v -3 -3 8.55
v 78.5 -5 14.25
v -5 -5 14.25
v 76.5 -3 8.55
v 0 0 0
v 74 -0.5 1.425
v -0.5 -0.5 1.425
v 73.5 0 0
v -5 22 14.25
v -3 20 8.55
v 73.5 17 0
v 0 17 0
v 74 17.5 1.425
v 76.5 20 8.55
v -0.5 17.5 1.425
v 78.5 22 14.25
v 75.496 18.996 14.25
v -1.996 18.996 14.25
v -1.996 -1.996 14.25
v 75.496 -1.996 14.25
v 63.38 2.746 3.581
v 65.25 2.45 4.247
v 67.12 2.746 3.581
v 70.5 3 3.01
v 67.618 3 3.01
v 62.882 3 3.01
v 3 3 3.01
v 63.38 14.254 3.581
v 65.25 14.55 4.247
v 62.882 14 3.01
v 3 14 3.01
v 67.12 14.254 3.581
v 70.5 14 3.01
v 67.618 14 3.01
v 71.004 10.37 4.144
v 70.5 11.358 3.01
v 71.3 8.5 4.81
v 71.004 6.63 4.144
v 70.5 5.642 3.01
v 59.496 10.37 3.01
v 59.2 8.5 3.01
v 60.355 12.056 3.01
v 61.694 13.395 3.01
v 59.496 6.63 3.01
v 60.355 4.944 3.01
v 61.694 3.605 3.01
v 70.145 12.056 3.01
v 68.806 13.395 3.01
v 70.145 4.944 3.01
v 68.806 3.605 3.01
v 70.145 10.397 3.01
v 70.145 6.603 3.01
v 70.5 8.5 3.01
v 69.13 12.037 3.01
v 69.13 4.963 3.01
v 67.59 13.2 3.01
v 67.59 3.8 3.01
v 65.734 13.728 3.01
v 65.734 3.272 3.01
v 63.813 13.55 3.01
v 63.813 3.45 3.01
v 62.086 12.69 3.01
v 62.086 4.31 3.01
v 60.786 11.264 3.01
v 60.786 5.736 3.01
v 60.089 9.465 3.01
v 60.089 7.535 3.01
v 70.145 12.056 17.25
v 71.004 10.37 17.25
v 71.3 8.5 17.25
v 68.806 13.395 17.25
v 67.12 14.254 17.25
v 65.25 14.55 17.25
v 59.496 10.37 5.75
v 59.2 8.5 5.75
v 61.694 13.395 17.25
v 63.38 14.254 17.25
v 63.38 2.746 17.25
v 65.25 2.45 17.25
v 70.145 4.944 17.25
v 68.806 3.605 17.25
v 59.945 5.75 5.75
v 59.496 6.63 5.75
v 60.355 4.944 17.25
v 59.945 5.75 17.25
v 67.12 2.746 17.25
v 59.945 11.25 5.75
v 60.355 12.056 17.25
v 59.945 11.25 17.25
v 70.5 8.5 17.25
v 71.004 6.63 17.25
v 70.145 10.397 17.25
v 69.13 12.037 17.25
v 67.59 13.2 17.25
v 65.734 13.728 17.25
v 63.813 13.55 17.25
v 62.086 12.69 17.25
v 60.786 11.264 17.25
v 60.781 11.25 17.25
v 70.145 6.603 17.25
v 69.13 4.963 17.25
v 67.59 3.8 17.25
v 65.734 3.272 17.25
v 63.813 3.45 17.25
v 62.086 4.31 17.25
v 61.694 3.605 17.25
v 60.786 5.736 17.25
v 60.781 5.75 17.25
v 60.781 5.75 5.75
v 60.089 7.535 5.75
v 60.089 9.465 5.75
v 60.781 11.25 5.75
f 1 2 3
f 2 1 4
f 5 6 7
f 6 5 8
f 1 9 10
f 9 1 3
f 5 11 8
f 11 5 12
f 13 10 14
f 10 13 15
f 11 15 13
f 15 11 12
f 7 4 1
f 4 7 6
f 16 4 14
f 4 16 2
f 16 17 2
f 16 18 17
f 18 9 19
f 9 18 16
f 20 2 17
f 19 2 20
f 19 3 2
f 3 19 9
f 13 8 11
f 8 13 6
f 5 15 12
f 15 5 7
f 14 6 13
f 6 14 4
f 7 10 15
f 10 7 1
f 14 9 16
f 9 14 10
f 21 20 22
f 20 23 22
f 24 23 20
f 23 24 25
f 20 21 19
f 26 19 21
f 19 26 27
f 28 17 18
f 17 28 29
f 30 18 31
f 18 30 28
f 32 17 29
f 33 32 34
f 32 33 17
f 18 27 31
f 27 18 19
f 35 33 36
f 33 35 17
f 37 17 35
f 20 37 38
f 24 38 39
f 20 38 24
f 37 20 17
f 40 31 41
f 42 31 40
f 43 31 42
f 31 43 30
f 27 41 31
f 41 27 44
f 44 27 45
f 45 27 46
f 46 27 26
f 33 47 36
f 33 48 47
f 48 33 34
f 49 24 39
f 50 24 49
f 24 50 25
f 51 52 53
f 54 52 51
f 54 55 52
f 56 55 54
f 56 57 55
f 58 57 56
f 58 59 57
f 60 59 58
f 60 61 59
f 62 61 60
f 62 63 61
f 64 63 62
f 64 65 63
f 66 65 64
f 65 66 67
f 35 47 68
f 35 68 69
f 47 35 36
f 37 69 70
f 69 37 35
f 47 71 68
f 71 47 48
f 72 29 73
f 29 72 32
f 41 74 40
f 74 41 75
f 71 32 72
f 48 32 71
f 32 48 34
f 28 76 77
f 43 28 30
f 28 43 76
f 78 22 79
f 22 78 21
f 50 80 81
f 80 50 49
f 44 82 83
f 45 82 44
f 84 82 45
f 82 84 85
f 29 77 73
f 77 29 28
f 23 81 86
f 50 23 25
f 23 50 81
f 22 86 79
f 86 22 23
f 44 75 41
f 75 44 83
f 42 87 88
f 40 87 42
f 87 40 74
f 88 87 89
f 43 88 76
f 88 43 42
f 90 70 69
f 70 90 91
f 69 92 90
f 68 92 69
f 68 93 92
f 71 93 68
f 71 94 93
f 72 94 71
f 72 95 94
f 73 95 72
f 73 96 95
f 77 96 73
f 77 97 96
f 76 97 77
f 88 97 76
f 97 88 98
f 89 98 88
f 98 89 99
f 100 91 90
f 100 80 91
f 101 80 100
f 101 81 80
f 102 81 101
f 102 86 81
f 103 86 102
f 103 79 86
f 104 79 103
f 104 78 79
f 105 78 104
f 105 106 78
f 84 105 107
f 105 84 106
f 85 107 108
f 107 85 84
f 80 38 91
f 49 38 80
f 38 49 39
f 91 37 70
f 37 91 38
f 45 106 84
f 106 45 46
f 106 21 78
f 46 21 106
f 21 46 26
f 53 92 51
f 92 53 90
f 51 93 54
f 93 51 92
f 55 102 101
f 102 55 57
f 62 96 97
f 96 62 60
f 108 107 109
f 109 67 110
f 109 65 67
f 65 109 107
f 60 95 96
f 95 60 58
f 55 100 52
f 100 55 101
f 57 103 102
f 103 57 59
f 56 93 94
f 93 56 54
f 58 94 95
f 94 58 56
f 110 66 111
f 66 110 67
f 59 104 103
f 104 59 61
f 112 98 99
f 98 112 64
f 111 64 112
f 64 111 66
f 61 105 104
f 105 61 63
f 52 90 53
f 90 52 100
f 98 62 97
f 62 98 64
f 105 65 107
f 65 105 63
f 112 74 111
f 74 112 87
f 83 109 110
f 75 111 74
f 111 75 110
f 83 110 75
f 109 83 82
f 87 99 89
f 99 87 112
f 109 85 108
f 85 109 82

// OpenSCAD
insideHeight=11;
insideWidth=10.5;
insideLength=67;
wallThickness=3;
socketOffsetFromEnd=0;
socketDiameter=10; // was 9.6
socketStickout=3;
socketWallThickness=0.8;
wireHoleHeight=8;
wireHoleWidth=5;
flange=5;
tolerance=0.25;

module end_of_parameters_dummy() {}

//use <tubemesh.scad>;
// params = [sections,sectionCounts]

// written for tail-recursion
// _subtotals[i] = list[0] + ... + list[i-1]
function _subtotals(list,soFar=[]) =
        len(soFar) >= 1+len(list) ? soFar :
        _subtotals(list,
            let(n1=len(soFar))
            concat(soFar, n1>0 ? soFar[n1-1]+list[n1-1] : 0));

function _flatten(list) = [for (a=list) for(b=a) b];

function _reverseTriangle(t) = [t[2], t[1], t[0]];

// smallest angle in triangle
function _minAngle(p1,p2,p3) =
    let(a = p2-p1,
        b = p3-p1,
        c = p3-p2,
        v1 = a*b,
        v2 = -(c*a))
        v1 == 0 || v2 == 0 ? 0 :
        let( na = norm(a),
             a1 = acos(v1 / (na*norm(b))),
             a2 = acos(v2 / (na*norm(c))) )
        min(a1,a2,180-(a1+a2));

// triangulate square to maximize smallest angle
function _doSquare(points,i11,i21,i22,i12,optimize=true) =
    points[i11]==points[i12] ? [[i11,i21,i22]] :
    points[i21]==points[i22] ? [[i22,i12,i11]] :
    !optimize ? [[i11,i21,i22], [i22,i12,i11]] :
    let (m1 = min(_minAngle(points[i11],points[i21],points[i22]), _minAngle(points[i22],points[i12],points[i11])),
        m2 = min(_minAngle(points[i11],points[i21],points[i12]),
                _minAngle(points[i21],points[i22],points[i12])) )
        m2 <= m1 ? [[i11,i21,i22], [i22,i12,i11]] :
                  [[i11,i21,i12], [i21,i22,i12]];

/*
function _inTriangle(v1,t) = (v1==t[0] || v1==t[1] || v1==t[2]);

function _findTheDistinctVertex(t1,t2) =
    let(in = [for(i=[0:2]) _inTriangle(t1[i],t2)])
    ! in[0] && in[1] && in[2] ? 0 :
    ! in[1] && in[0] && in[2] ? 1 :
    ! in[2] && in[0] && in[1] ? 2 :
    undef;

// make vertex i come first
function _rotateTriangle(t,i) =
    [for (j=[0:2]) t[(j+i)%3]];

function _optimize2Triangles(points,t1,t2) =
    let(i1 = _findTheDistinctVertex(t1,t2))
    i1 == undef ? [t1,t2] :
    let(i2 = _findTheDistinctVertex(t2,t1))
    i2 == undef ? [t1,t2] :
    let(t1 = _rotateTriangle(t1,i1),
        t2 = _rotateTriangle(t2,i2))
    _doSquare(points,t1[1],t2[0],t2[1],t1[0],optimize=true);

// a greedy optimization for a strip of triangles most of which adjoin one another; written for tail-recursion
function _optimizeTriangles(points,triangles,position=0,optimize=true,iterations=4) =
        !optimize || position >= iterations*len(triangles) ? triangles :
            _optimizeTriangles(points,
                let(
                    n = len(triangles),
                    position1=position%n,
                    position2=(position+1)%n,
                    opt=_optimize2Triangles(points,triangles[position1],triangles[position2]))
                    [for (i=[0:len(triangles)-1])
                        i == position1 ? opt[0] :
                        i == position2 ? opt[1] :
                            triangles[i]],
                position=position+1);
*/

function _removeEmptyTriangles(points,triangles) =
    [for(t=triangles)
        if(true || points[t[0]] != points[t[1]] && points[t[1]] != points[t[2]] && points[t[2]] != points[t[0]]) t];

// n1 and n2 should be fairly small, so this doesn't need
// tail-recursion
// this assumes n1<=n2
function _tubeSegmentTriangles(points,index1,n1,index2,n2,i=0,soFar=[],optimize=true)
    = i>=n2 ? _removeEmptyTriangles(points,soFar) :
            let(i21=i,
                i22=(i+1)%n2,
                i11=floor((i21)*n1/n2+0.5)%n1,
                i12=floor((i22)*n1/n2+0.5)%n1,
                add = i11==i12 ? [[index1+i11,index2+i21,index2+i22]] :
                    _doSquare(points,index1+i11,index2+i21,index2+i22,index1+i12,optimize=optimize))
                _tubeSegmentTriangles(points,index1,n1,index2,n2,i=i+1,soFar=concat(soFar,add),optimize=optimize);

function _tubeSegmentFaces(points,index,n1,n2,optimize=true)
    = n1<n2 ? _tubeSegmentTriangles(points,index,n1,index+n1,n2,optimize=optimize) :
        [for (f=_tubeSegmentTriangles(points,index+n1,n2,index,n1,optimize=optimize)) _reverseTriangle(f)];

function _tubeMiddleFaces(points,counts,subtotals,optimize=true) = [ for (i=[1:len(counts)-1])
           for (face=_tubeSegmentFaces(points,subtotals[i-1],counts[i-1],counts[i],optimize=optimize)) face ];

function _endCaps(counts,subtotals,startCap=true,endCap=true) =
    let( n = len(counts),
         cap1 = counts[0]<=2 || !startCap ? undef : [for(i=[0:counts[0]-1]) i],
         cap2 = counts[n-1]<=2 || !endCap ? undef : [for(i=[counts[n-1]-1:-1:0]) subtotals[n-1]+i] )
       [for (c=[cap1,cap2]) if (c!=undef) c];

function _tubeFaces(sections,startCap=true,endCap=true,optimize=true) =
                let(
        counts = [for (s=sections) len(s)],
        points = _flatten(sections),
        subtotals = _subtotals(counts))
            concat(_tubeMiddleFaces(points,counts,subtotals,optimize=optimize),_endCaps(counts,subtotals,startCap=true,endCap=true));

function _removeDuplicates1(points,soFar=[[],[]]) =
        len(soFar[0]) >= len(points) ? soFar :
            _removeDuplicates1(points,
               let(
                mapSoFar=soFar[0],
                pointsSoFar=soFar[1],
                j=len(mapSoFar),
                k=search([points[j]], pointsSoFar)[0])
                k == []? [concat(mapSoFar,[len(pointsSoFar)]),
                            concat(pointsSoFar,[points[j]])] :
                           [concat(mapSoFar,[k]),pointsSoFar]);

function _removeDuplicates(points, faces) =
    let(fix=_removeDuplicates1(points),
        map=fix[0],
        newPoints=fix[1],
        newFaces=[for(f=faces) [for(v=f) map[v]]])
            [newPoints, newFaces];

function pointsAndFaces(sections,startCap=true,endCap=true,optimize=true) =
        let(
            points0=_flatten(sections),
            faces0=_tubeFaces(sections,startCap=startCap,endCap=endCap,optimize=optimize))
        _removeDuplicates(points0,faces0);

module tubeMesh(sections,startCap=true,endCap=true,optimize=true) {
    pAndF = pointsAndFaces(sections,startCap=startCap,endCap=endCap,optimize=optimize);
    polyhedron(points=pAndF[0],faces=pAndF[1]);
}

// increase number of points from len(section) to n
function _interpolateSection(section,n) =
        let(m=len(section))
        n == m ? section :
        n < m ? undef :
            [for(i=[0:m-1])
                let(cur=floor(i*n/m),
                    k=floor((i+1)*n/m)-cur,
                    i2=(i+1)%m)
                    for(j=[0:k-1])
                        let(t=j/k)
                            section[i]*(1-t)+section[i2]*t];

function ngonPoints(n=4,r=10,d=undef,rotate=0,z=undef) =
            let(r=d==undef?r:d/2)
            z==undef ?
            r*[for(i=[0:n-1]) let(angle=i*360/n+rotate) [cos(angle),sin(angle)]] :
            [for(i=[0:n-1]) let(angle=i*360/n+rotate) [r*cos(angle),r*sin(angle),z]];

function starPoints(n=10,r1=5,r2=10,rotate=0,z=undef) =
          z==undef ?
            [for(i=[0:2*n-1]) let(angle=i*180/n+rotate) (i%2?r1:r2) * [cos(angle),sin(angle)]] :
            [for(i=[0:2*n-1]) let(angle=i*180/n+rotate, r=i%2?r1:r2) [r*cos(angle),r*sin(angle),z]];

// warning: no guarantee of perfect convexity
module mySphere(r=10,d=undef) {
    GA = 2.39996322972865332 * 180 / PI;
    radius = d==undef ? r : d/2;
    pointsAround =
        $fn ? $fn :
        max(3, floor(0.5+360/$fa), floor(0.5+2*radius*PI/$fs));
    numSlices0 = (pointsAround + pointsAround % 2)/2;
    numSlices = numSlices0 + (numSlices0%2);
    sections = radius*[for(i=[0:numSlices])
                    i == 0 ? [[0,0,-1]] :
                    i == numSlices ? [[0,0,1]] :
                    let(
                        lat = (i-numSlices/2)/(numSlices/2)*90,
                        z1 = sin(lat),
                        r1 = cos(lat),
                        count = max(3,floor(0.5 + pointsAround * abs(r1))))
                        ngonPoints(count,r=r1,z=z1)];
    data = pointsAndFaces(sections,optimize=false);
    polyhedron(points=data[0], faces=data[1]);
}

module morphExtrude(section1,section2,height=undef,twist=0,numSlices=10,startCap=true,endCap=true,optimize=false) {
    n = max(len(section1),len(section2));

    section1interp = _interpolateSection(section1,n);
    section2interp = _interpolateSection(section2,n);
    sections = height == undef ?
                      [for(i=[0:numSlices])
                        let(t=i/numSlices)
                        (1-t)*section1interp+t*section2interp] :
                      [for(i=[0:numSlices])
                        let(t=i/numSlices,
                            theta = t*twist,
                            section=(1-t)*section1interp+t*section2interp)
                        [for(p=section) [p[0]*cos(theta)-p[1]*sin(theta),p[0]*sin(theta)+p[1]*cos(theta),height*t]]];

    tubeMesh(sections,startCap=startCap,endCap=endCap,optimize=false);
}

module cone(r=10,d=undef,height=10) {
    radius = d==undef ? r : d/2;
    pointsAround =
        $fn ? $fn :
        max(3, floor(0.5+360/$fa), floor(0.5+2*radius*PI/$fs));
    morphExtrude(ngonPoints(n=pointsAround,r=radius), [[0,0]], height=height,optimize=false);
}

module prism(base=[[0,0,0],[1,0,0],[0,1,0]], vertical=[0,0,1]) {
    morphExtrude(base,[for(v=base) v+vertical],numSlices=1);
}



module dummy(){}

nudge = 0.01;

insideHeight1=insideHeight+tolerance;
insideWidth1=insideWidth+2*tolerance;
socketDiameter1=socketDiameter+2*tolerance;
insideLength1=insideLength+2*tolerance;

module box(wallThickness) {
    x = 2*wallThickness+insideLength1;
    y = 2*wallThickness+insideWidth1;
    top = [[-flange,-flange],[x+flange,-flange],[x+flange,y+flange],[-flange,y+flange]];
    base = [[0,0],[x,0],[x,y],[0,y]];
    morphExtrude(base,top,height=insideHeight1+wallThickness);
//    cube([2*wallThickness+insideLength1,2*wallThickness+insideWidth1,wallThickness+insideHeight1]);
}

render(convexity=2) {
    difference() {
        box(wallThickness);
        translate([wallThickness,wallThickness,wallThickness+nudge]) box(0);
    }
    translate([wallThickness+insideLength1-socketDiameter1/2-socketOffsetFromEnd,wallThickness+insideWidth1/2,0]) difference() {
            cylinder(d=socketDiameter1+2*socketWallThickness,h=insideHeight1+wallThickness+socketStickout);
            cylinder(d=socketDiameter1,h=insideHeight1+wallThickness+socketStickout+nudge);
            translate([-socketDiameter1,-wireHoleWidth/2-tolerance,insideHeight1+wallThickness-wireHoleHeight-2*tolerance]) cube([socketDiameter1,wireHoleWidth+2*tolerance,wireHoleHeight+2*tolerance+socketStickout]);
    }
}
